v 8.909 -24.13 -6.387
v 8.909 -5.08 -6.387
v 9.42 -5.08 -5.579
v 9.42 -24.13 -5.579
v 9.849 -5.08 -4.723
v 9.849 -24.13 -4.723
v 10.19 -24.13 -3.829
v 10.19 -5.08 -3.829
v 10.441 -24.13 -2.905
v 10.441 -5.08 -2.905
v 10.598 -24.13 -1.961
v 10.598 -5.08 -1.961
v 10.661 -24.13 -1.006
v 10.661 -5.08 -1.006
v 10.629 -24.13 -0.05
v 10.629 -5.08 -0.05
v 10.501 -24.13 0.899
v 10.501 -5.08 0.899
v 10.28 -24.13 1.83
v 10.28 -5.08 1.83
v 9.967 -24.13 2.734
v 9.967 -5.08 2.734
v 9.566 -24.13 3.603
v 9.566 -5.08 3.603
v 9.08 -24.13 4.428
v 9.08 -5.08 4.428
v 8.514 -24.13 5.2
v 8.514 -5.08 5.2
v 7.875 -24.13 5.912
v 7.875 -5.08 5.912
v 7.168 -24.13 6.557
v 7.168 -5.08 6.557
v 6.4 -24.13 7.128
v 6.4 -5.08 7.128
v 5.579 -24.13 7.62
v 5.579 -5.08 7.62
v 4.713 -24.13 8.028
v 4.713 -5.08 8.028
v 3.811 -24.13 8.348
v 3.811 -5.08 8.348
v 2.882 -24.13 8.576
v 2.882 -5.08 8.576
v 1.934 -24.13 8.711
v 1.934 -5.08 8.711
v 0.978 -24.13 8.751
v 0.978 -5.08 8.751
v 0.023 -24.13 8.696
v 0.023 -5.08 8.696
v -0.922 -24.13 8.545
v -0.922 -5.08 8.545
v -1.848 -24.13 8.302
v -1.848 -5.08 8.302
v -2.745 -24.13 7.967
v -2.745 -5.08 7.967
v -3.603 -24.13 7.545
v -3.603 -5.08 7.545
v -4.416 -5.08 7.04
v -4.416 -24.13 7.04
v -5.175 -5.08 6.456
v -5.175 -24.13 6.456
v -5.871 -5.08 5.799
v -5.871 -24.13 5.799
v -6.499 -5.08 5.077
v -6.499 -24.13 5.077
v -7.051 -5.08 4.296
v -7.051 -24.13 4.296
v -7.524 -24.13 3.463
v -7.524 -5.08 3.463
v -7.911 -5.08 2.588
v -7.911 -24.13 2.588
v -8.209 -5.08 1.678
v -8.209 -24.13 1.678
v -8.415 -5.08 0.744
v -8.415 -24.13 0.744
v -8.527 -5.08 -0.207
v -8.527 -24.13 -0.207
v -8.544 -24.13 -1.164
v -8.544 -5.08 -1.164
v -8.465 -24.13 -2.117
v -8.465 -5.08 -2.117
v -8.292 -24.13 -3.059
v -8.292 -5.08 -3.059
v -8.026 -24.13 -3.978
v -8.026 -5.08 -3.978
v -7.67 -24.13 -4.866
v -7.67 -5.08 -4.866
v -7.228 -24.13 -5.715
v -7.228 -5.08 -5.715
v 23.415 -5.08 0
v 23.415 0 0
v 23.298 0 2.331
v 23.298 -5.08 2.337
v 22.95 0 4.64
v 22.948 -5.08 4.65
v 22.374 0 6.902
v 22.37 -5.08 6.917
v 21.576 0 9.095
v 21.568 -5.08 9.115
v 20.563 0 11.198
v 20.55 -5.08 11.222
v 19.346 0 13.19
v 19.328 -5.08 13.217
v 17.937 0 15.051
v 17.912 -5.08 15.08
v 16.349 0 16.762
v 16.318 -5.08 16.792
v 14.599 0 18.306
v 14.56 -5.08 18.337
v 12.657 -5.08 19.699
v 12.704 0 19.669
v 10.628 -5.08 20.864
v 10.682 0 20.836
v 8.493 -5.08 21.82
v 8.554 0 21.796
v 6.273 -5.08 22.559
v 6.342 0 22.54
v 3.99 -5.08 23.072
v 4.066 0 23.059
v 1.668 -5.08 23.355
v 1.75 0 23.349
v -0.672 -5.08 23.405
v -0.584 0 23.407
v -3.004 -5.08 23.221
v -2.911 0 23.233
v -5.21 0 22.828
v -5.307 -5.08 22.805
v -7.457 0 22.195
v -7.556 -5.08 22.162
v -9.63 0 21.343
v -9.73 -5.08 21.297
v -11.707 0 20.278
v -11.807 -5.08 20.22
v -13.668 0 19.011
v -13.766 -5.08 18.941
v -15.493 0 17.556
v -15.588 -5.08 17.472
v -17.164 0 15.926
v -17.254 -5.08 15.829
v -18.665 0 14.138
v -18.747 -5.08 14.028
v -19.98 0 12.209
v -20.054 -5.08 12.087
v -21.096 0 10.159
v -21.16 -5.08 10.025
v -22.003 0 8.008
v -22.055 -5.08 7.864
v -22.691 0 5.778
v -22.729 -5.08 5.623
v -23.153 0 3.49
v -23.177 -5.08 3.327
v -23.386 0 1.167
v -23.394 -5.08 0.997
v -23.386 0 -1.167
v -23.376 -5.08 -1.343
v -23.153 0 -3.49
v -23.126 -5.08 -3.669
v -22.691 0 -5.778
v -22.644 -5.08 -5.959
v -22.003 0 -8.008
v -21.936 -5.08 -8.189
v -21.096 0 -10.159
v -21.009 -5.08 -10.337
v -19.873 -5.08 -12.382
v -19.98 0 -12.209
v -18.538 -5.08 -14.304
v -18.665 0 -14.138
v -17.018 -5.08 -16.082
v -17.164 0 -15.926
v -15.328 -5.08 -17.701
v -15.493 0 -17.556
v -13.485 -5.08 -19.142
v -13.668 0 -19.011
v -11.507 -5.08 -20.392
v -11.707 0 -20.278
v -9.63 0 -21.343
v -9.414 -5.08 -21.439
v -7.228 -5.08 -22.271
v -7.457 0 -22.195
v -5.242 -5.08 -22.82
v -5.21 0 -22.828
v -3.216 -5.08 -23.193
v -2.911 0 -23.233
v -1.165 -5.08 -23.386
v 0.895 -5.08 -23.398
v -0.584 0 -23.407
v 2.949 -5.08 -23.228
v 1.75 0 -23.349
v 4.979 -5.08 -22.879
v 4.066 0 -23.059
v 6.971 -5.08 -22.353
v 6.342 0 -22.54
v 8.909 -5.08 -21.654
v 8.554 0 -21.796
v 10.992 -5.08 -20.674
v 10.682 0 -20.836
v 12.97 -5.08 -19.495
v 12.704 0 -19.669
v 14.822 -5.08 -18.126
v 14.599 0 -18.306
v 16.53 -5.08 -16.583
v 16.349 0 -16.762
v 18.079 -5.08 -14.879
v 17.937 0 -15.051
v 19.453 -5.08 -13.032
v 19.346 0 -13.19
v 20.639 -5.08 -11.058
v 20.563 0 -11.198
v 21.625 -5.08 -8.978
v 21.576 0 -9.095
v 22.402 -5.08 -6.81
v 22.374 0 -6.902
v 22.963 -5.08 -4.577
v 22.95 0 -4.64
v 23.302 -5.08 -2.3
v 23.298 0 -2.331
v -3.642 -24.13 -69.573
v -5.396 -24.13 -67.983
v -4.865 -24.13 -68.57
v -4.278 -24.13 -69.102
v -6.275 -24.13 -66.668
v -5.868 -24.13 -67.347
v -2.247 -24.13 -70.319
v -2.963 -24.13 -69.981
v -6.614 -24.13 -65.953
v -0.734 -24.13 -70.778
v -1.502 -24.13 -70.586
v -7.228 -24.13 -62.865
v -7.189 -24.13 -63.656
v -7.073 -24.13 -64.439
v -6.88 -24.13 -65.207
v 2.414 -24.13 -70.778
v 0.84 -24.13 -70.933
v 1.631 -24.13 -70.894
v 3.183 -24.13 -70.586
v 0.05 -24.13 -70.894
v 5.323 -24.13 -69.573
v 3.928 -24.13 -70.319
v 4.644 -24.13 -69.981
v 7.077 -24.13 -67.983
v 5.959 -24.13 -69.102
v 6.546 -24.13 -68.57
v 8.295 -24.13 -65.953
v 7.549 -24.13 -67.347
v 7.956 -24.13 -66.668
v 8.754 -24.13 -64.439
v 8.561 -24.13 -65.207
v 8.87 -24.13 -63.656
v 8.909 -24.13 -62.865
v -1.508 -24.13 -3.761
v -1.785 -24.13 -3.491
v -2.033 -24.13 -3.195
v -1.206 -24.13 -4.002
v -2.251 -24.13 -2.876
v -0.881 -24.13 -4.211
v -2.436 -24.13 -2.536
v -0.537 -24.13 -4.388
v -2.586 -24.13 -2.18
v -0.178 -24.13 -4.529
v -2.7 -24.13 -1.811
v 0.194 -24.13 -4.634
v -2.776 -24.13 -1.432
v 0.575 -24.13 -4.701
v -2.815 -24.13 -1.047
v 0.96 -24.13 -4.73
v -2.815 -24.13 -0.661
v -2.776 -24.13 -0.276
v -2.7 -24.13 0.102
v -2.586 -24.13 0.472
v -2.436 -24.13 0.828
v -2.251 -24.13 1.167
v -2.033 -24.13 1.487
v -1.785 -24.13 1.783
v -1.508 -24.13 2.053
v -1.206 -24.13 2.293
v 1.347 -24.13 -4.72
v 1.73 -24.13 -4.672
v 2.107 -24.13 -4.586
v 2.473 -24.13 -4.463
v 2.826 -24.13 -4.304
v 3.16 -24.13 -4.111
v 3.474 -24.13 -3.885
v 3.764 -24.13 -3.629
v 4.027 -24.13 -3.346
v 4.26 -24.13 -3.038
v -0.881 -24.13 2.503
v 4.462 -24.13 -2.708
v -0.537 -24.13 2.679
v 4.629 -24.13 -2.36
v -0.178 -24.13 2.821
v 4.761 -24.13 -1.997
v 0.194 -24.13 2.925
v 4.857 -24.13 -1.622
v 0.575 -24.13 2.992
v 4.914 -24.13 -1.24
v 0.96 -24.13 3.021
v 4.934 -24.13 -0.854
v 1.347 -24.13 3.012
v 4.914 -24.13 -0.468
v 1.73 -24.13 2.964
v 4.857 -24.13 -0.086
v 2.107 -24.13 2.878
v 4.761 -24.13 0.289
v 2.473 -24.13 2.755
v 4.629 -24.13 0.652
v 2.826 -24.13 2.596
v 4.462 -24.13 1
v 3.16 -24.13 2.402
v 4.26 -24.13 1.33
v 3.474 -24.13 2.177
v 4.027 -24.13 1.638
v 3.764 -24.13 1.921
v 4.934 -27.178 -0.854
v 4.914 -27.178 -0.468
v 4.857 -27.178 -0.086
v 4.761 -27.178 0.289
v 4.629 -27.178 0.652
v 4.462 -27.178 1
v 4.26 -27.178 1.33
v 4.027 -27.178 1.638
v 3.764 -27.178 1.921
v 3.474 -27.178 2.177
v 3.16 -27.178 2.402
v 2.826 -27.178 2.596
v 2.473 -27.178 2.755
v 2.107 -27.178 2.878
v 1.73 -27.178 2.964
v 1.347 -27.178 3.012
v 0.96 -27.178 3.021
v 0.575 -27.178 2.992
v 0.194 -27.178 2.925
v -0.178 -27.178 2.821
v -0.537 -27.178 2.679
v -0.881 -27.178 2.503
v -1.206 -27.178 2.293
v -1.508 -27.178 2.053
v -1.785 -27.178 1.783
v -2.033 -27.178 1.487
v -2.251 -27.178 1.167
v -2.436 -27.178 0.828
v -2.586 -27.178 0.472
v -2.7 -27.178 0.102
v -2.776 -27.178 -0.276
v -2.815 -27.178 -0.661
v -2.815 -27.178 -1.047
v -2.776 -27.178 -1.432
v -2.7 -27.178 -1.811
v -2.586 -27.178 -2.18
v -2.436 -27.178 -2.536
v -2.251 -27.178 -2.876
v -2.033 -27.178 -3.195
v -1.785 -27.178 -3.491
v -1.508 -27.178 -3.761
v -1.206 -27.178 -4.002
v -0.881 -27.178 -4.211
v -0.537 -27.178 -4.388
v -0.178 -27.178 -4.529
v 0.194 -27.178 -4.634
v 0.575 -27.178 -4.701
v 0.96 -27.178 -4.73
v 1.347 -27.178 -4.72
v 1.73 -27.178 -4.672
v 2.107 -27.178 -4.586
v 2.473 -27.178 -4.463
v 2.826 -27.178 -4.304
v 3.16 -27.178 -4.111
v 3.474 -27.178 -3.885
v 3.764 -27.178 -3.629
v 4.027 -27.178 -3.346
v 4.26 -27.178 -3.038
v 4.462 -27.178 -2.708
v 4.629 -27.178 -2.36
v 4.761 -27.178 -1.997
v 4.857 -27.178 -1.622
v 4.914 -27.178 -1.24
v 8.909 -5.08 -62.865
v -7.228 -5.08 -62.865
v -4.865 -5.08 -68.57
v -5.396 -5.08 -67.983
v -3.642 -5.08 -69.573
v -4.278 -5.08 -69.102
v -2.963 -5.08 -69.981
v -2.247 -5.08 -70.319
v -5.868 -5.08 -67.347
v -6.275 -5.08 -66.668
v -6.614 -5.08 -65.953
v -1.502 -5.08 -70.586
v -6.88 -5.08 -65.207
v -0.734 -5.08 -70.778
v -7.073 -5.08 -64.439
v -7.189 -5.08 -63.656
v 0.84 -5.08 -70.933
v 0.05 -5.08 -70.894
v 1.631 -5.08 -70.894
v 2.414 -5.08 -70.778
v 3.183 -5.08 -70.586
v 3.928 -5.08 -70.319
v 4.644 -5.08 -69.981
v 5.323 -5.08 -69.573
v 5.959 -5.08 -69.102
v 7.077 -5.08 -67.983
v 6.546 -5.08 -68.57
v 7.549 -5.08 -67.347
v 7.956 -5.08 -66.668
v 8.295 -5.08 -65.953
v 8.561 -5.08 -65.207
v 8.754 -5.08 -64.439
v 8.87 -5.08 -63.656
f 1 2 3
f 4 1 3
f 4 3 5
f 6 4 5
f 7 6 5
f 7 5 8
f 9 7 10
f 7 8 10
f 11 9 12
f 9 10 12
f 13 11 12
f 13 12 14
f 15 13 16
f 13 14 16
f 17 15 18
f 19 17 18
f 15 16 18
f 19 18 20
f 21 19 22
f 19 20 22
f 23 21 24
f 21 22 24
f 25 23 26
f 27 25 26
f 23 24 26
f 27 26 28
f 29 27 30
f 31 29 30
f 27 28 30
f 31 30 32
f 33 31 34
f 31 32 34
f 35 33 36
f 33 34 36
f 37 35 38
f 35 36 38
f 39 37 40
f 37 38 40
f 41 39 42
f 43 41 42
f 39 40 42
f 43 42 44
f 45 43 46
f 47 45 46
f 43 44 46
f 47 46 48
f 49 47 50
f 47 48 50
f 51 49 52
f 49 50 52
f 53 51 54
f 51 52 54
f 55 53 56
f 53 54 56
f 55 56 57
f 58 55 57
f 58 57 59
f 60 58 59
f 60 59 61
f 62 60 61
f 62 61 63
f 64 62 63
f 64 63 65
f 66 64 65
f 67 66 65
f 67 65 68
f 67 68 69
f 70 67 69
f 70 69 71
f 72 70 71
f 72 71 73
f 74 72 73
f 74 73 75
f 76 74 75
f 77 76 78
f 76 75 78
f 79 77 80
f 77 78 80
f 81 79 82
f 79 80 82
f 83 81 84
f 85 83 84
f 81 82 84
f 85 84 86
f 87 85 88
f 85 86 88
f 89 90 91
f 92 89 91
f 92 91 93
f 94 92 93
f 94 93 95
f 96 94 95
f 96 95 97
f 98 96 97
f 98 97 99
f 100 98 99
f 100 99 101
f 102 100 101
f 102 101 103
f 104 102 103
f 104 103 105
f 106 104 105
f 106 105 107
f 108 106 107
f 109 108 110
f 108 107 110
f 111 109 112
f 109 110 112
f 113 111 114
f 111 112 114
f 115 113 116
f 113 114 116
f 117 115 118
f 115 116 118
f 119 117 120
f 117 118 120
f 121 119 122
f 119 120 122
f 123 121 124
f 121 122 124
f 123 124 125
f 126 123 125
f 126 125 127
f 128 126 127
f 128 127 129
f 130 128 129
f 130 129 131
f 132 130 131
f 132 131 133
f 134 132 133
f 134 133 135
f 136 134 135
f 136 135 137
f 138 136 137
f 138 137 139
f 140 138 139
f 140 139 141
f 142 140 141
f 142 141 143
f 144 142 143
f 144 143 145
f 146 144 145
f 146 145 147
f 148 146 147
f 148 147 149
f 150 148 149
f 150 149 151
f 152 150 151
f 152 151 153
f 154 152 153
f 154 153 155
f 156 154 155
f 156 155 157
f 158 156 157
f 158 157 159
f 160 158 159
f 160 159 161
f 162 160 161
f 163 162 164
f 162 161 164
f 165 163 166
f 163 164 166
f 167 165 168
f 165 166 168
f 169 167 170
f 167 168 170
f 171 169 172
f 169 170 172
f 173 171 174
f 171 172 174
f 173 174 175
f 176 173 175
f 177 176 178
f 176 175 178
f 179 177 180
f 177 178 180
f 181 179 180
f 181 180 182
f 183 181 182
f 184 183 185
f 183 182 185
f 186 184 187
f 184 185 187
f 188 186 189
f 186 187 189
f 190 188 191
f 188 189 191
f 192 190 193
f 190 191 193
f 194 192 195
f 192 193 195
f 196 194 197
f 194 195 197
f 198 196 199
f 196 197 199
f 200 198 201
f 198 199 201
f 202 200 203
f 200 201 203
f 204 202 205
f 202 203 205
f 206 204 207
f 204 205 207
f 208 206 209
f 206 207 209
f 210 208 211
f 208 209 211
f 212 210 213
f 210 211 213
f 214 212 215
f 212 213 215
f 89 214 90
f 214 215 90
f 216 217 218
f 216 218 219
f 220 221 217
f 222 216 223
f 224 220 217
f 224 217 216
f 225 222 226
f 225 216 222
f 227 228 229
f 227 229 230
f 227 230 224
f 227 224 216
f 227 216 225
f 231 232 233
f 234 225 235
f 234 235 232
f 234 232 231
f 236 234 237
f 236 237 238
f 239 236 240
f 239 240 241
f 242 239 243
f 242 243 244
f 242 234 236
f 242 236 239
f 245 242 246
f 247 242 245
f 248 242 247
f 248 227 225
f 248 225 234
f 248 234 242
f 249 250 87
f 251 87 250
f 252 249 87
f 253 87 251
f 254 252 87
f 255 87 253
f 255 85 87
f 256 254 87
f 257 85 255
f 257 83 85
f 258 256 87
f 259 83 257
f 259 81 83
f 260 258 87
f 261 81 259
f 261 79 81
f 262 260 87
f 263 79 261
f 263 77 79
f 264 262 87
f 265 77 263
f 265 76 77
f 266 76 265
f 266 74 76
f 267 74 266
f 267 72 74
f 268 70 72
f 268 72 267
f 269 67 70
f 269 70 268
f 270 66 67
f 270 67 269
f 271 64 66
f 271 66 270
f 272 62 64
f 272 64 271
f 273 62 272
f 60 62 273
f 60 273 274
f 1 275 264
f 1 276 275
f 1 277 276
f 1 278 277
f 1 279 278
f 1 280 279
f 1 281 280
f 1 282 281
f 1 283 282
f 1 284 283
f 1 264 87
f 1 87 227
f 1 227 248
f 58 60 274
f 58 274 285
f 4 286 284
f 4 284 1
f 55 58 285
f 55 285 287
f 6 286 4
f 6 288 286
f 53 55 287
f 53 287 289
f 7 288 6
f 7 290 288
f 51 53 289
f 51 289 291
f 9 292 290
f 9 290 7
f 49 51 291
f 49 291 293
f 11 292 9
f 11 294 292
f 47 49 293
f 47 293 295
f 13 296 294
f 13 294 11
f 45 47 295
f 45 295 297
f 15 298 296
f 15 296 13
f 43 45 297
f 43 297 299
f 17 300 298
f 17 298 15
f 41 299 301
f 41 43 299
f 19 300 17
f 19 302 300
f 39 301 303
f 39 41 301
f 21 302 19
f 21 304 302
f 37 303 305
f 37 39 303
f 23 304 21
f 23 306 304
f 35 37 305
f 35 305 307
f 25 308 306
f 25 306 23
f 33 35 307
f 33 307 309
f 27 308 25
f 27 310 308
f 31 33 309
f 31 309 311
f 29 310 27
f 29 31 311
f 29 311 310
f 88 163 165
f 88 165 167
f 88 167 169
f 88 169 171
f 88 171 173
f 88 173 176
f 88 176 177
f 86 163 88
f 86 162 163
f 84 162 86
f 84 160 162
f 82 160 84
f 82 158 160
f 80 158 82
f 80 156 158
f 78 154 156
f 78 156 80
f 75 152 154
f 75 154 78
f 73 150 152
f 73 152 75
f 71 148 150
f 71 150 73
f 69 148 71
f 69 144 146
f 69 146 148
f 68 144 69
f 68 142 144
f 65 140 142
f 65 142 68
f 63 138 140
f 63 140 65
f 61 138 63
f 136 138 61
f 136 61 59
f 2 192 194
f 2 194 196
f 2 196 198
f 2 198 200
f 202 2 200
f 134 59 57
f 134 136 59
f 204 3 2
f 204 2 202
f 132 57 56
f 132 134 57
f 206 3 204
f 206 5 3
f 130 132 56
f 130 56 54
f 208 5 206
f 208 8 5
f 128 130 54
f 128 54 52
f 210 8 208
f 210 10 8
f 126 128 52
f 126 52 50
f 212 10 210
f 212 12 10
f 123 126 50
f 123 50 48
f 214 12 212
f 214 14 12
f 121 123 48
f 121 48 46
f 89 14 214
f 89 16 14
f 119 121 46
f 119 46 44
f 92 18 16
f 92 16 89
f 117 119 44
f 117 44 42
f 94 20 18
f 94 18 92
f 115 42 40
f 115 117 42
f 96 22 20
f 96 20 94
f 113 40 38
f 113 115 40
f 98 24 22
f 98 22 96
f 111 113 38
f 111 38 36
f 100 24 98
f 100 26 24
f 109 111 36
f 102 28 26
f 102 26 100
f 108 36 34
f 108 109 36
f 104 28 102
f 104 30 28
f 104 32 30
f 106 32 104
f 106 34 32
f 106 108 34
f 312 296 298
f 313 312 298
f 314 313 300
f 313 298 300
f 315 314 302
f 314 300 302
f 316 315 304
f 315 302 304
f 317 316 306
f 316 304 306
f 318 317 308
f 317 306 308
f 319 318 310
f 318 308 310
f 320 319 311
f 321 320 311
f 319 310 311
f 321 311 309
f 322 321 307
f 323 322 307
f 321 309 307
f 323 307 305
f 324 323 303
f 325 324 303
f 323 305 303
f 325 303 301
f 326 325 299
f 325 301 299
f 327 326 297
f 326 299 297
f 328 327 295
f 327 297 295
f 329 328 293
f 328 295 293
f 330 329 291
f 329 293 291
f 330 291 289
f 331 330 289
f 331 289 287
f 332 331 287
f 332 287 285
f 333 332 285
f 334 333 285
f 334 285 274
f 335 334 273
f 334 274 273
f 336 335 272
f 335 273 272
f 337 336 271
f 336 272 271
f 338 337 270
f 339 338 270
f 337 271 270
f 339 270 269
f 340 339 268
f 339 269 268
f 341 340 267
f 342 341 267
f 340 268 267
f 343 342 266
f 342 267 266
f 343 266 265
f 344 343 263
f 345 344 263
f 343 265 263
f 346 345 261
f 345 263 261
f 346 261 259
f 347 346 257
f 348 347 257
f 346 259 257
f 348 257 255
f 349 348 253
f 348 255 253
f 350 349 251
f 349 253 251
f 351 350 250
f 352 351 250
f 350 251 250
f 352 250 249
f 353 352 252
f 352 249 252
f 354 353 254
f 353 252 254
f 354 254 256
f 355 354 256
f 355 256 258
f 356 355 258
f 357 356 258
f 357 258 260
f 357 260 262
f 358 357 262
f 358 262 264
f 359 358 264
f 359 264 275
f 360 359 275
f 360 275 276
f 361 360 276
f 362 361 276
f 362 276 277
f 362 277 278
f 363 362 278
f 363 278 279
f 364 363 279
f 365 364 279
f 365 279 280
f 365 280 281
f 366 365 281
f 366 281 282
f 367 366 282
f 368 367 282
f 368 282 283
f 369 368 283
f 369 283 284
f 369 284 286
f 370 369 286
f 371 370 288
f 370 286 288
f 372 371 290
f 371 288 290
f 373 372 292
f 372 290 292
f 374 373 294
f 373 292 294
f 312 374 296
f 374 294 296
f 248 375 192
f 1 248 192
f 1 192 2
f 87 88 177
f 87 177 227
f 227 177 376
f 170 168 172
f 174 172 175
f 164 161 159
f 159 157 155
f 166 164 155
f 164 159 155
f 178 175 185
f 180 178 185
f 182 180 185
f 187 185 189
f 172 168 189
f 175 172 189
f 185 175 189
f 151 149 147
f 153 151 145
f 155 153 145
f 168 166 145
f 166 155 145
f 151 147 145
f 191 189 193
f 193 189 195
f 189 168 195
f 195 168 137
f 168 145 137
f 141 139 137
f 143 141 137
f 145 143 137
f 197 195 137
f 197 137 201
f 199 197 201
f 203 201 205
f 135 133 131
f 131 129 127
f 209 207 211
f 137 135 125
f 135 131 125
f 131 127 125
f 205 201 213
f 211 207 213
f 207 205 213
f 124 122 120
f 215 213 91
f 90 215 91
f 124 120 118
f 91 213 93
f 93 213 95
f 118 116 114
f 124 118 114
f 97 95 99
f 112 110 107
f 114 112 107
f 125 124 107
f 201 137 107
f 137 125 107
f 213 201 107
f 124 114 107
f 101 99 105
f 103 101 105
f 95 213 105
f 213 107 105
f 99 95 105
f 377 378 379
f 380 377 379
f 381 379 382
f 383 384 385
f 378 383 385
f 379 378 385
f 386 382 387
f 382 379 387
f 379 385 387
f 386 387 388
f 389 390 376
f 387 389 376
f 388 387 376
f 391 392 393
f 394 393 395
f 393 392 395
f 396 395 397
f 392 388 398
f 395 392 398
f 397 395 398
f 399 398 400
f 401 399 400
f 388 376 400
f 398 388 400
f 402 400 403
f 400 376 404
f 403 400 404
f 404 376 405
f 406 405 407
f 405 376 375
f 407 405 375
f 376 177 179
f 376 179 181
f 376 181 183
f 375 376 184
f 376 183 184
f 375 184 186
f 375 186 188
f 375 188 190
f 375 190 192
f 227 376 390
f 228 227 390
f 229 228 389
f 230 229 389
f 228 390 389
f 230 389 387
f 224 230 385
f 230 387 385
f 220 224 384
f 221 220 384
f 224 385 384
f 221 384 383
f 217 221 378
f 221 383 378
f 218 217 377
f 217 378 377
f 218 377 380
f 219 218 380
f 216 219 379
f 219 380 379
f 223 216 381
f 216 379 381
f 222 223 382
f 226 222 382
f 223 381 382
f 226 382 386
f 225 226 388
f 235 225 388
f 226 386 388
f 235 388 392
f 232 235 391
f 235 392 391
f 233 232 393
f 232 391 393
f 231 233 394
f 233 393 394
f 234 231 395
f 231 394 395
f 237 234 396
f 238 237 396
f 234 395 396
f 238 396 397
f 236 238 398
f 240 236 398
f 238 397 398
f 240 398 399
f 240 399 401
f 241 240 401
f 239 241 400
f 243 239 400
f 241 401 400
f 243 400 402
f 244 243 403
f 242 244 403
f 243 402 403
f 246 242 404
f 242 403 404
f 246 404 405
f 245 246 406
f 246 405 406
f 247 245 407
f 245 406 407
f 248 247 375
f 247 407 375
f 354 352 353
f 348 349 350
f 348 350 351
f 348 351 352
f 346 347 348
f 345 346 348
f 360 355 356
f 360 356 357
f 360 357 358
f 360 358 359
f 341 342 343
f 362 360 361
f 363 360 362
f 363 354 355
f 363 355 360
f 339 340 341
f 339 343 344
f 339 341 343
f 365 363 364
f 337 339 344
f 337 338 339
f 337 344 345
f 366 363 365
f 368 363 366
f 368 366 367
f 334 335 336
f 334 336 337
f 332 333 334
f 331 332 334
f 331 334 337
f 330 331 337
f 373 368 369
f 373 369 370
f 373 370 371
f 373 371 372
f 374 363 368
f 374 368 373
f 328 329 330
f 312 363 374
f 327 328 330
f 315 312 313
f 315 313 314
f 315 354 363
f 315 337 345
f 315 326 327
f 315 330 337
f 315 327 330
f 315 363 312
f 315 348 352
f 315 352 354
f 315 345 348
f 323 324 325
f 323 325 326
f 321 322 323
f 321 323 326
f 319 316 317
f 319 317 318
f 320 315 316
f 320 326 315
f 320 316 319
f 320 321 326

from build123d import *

# Parameters (mm, degrees)
F0_R     = 23.414747
F1_DEPTH = 5.08
F3_DEPTH = 19.05
F4_R     = 3.876648
F5_DEPTH = 3.048


with BuildPart() as f1:
    # F0 (on Front) → F1 (new body)
    with BuildSketch(Plane.XZ):
        Circle(F0_R)
    extrude(amount=F1_DEPTH)

    # F2 (on face) → F3 (join)
    with BuildSketch(Plane.XZ.offset(5.08)):
        with BuildLine():
            ThreePointArc((8.908676, -21.653772), (0.895358, -23.397622), (-7.227794, -22.271268))
            Line((-7.227794, -22.271268), (-7.227794, -62.864996))
            ThreePointArc((-7.227794, -62.864996), (0.840441, -70.933231), (8.908676, -62.864996))
            Line((8.908676, -62.864996), (8.908676, -21.653772))
        make_face()
        with BuildLine():
            ThreePointArc((8.908676, -6.387353), (1.456869, 8.743082), (-7.227794, -5.715))
            Line((-7.227794, -5.715), (-7.227794, -22.271268))
            ThreePointArc((-7.227794, -22.271268), (0.895358, -23.397622), (8.908676, -21.653772))
            Line((8.908676, -21.653772), (8.908676, -6.387353))
        make_face()
    extrude(amount=F3_DEPTH)

    # F4 (on face) → F5 (join)
    with BuildSketch(Plane.XZ.offset(24.13)):
        with Locations((1.056986, -0.854104)):
            Circle(F4_R)
    extrude(amount=F5_DEPTH)


solid = f1.part
